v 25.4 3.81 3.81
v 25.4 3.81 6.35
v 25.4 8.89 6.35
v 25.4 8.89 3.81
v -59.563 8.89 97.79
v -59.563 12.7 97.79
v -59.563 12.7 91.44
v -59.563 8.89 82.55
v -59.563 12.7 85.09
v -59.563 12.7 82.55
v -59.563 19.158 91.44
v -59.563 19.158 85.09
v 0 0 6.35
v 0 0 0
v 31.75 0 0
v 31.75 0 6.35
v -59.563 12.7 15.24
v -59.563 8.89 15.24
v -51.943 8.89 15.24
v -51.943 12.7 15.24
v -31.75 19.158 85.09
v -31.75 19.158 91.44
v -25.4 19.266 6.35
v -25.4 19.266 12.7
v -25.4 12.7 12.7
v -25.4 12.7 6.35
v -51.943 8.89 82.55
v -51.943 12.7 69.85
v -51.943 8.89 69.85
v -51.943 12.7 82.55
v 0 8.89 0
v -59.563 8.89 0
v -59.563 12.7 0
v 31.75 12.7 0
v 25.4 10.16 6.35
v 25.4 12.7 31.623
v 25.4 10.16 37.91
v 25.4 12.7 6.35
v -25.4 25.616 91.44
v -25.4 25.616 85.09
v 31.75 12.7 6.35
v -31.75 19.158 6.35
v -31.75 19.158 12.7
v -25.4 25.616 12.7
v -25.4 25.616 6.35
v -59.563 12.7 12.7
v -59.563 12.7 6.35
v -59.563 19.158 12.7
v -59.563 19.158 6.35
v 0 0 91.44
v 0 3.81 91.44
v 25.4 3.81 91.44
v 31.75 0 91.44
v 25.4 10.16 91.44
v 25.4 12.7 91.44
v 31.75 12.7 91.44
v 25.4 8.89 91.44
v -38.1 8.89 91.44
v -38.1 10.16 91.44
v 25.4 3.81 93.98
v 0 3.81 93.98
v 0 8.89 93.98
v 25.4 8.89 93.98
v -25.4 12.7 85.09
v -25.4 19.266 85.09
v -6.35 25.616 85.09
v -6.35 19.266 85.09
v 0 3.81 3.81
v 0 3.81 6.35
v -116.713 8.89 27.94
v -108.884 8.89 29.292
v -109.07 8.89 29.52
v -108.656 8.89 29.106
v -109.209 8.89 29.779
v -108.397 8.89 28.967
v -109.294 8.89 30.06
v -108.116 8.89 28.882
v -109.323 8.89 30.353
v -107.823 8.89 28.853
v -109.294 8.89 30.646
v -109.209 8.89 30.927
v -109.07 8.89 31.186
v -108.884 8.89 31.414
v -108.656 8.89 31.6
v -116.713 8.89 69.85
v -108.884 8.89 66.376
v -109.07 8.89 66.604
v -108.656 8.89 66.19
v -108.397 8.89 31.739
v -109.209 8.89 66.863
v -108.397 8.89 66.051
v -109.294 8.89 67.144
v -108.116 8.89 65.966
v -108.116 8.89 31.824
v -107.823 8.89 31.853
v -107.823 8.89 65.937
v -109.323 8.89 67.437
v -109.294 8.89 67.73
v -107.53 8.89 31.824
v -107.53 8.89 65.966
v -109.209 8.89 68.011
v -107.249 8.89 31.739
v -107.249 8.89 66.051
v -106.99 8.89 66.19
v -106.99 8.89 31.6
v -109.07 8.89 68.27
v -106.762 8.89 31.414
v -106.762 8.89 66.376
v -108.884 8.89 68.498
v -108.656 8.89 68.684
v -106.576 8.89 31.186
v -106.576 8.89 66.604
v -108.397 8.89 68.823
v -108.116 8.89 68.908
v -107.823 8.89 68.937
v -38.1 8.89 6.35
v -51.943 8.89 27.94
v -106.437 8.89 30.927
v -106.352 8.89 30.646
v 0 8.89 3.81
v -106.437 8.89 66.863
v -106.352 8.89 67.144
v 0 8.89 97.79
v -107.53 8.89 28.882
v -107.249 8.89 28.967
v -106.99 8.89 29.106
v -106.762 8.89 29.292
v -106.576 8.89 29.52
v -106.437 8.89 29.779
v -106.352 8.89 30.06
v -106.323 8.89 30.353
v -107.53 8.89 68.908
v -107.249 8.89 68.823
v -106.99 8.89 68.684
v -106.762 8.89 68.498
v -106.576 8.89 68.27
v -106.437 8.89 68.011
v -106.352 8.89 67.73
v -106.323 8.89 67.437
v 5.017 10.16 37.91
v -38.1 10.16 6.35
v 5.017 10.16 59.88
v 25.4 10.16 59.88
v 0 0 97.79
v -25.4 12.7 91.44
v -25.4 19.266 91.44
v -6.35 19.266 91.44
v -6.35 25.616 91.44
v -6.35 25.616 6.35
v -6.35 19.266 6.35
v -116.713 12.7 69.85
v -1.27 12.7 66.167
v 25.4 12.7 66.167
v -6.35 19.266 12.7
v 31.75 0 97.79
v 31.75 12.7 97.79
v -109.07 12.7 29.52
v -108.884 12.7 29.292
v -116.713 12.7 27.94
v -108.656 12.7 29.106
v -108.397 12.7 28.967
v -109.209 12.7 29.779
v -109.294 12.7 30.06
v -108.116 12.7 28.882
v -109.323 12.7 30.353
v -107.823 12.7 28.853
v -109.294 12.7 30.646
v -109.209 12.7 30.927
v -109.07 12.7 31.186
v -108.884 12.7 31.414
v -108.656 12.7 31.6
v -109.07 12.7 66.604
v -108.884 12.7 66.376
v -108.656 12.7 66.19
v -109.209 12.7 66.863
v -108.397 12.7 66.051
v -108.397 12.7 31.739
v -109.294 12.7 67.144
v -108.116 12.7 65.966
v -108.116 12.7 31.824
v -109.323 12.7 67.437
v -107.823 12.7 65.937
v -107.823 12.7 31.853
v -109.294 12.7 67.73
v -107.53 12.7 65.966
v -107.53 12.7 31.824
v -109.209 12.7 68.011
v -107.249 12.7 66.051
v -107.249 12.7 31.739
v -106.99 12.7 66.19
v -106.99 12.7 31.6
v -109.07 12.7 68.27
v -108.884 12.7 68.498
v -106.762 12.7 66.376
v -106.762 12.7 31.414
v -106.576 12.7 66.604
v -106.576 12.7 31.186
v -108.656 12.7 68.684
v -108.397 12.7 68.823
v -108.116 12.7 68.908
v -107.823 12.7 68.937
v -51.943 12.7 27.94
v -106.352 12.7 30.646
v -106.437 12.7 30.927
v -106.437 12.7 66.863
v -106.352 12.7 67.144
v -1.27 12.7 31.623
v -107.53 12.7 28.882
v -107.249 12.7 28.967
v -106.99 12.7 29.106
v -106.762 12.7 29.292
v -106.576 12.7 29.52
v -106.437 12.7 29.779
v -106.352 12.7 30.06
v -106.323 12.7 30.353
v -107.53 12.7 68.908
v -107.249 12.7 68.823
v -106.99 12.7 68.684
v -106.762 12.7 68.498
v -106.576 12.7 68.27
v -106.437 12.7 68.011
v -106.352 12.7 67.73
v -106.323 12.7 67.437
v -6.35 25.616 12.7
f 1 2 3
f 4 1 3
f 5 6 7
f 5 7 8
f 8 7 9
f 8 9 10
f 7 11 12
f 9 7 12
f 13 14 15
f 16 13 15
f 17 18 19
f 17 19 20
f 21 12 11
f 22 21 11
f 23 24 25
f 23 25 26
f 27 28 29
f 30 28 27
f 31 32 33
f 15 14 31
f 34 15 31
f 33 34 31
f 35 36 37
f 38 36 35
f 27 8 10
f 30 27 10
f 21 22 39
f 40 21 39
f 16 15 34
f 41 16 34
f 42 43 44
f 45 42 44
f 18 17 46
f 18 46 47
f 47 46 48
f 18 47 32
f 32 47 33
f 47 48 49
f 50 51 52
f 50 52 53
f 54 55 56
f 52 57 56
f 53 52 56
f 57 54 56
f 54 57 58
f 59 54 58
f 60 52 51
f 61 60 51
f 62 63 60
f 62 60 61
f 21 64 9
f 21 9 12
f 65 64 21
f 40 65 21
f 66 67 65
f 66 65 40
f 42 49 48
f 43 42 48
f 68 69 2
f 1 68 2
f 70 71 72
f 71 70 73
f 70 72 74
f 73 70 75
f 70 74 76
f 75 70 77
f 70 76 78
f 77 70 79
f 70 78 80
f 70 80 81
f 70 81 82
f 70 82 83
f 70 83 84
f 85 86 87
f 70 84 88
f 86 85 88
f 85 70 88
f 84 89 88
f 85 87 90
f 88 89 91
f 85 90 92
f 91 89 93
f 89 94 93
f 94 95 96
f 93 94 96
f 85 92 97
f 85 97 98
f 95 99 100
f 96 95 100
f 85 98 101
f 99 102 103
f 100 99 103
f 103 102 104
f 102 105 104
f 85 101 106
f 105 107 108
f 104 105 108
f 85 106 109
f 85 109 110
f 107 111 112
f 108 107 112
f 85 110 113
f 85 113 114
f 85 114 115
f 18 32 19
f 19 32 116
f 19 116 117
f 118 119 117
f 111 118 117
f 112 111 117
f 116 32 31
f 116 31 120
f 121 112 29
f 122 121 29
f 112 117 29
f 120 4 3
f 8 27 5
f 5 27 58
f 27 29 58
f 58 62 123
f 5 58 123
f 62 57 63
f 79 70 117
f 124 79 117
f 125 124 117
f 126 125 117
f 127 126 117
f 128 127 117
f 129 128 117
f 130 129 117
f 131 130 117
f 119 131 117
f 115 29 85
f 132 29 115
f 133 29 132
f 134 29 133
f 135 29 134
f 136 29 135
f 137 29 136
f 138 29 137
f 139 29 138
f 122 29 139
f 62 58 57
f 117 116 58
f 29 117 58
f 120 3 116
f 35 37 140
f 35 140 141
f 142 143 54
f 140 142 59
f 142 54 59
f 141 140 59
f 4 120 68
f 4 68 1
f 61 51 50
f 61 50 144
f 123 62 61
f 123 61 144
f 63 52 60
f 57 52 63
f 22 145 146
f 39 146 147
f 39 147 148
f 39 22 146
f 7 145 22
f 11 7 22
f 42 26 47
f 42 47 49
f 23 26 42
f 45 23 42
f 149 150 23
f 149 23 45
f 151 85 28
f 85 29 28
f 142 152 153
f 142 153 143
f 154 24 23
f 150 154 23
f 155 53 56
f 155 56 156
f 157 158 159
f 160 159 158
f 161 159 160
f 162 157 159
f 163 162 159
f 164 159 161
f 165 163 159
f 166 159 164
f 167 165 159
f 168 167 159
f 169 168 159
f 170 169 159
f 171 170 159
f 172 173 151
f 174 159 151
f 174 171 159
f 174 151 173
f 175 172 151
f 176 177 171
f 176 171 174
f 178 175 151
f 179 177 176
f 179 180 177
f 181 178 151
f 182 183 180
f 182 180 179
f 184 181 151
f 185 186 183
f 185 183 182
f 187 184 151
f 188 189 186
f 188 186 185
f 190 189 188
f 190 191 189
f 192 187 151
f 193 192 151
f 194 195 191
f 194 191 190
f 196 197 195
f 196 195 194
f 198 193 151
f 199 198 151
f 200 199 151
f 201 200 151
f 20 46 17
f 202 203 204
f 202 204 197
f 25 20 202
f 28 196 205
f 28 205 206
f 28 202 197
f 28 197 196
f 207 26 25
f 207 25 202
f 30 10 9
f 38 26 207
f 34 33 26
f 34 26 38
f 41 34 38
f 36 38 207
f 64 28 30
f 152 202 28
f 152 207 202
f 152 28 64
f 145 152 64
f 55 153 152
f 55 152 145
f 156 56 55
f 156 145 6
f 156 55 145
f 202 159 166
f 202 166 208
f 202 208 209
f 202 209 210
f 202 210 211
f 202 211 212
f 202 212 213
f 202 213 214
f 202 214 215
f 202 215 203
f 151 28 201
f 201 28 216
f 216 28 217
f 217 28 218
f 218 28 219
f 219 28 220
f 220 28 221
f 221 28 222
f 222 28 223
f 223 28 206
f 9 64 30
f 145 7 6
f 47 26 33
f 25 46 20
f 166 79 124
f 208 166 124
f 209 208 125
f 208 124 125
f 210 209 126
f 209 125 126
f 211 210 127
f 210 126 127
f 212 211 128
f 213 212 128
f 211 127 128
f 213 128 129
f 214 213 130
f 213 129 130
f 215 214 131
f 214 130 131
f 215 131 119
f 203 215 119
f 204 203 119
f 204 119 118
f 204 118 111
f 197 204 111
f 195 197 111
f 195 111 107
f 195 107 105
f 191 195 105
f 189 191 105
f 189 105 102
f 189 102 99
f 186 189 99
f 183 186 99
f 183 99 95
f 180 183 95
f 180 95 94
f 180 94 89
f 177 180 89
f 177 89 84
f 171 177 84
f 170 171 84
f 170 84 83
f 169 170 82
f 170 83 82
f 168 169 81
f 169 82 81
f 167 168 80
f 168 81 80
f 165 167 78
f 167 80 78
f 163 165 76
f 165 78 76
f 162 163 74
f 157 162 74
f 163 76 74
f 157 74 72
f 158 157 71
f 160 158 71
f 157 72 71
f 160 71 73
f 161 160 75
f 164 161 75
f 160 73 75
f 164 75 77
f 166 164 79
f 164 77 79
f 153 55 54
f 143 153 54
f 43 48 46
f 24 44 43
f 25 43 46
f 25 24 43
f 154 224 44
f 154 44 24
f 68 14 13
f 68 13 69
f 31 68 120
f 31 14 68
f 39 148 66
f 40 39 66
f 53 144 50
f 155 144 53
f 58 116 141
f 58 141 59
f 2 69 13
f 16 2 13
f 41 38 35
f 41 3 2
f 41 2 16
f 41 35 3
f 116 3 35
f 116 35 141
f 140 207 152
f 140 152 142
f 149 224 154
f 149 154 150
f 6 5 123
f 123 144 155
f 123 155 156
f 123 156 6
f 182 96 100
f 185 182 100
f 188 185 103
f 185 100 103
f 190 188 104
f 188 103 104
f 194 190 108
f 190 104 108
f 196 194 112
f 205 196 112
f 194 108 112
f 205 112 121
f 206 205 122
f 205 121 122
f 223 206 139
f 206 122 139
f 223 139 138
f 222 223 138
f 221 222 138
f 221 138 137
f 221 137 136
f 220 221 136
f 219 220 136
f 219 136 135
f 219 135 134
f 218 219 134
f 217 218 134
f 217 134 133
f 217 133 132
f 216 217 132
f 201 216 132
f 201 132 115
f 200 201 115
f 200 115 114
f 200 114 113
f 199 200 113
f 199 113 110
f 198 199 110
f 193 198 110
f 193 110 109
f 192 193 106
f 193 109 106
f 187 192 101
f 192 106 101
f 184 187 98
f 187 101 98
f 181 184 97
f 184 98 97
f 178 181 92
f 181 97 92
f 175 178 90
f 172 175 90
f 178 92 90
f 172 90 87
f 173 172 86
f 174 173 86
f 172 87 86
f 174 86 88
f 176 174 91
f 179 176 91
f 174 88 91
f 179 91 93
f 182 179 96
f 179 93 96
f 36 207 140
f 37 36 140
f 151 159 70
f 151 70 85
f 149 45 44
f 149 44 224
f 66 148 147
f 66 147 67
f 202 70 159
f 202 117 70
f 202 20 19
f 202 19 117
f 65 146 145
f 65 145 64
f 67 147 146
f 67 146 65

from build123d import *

# Parameters (mm, degrees)
SKETCH1_W                = 31.75
SKETCH1_H                = 12.7
BOSS_EXTRUDE1_DEPTH      = 6.35
SKETCH3_W                = 25.4
SKETCH3_H                = 5.08
CUT_EXTRUDE1_DEPTH       = 2.54
BOSS_EXTRUDE2_DEPTH      = 3.81
SKETCH5_W                = 31.75
SKETCH5_H                = 6.35
BOSS_EXTRUDE3_DEPTH      = 8.89
SKETCH6_W                = 25.4
SKETCH6_H                = 5.08
CUT_EXTRUDE2_DEPTH       = 2.54
SKETCH9_W                = 6.35
SKETCH9_H                = 3.81
BOSS_EXTRUDE5_DEPTH      = 6.35
SKETCH10_W               = 6.35
SKETCH10_H               = 6.35
BOSS_EXTRUDE6_DEPTH      = 12.9159
SKETCH12_W               = 6.35
SKETCH12_H               = 3.81
BOSS_EXTRUDE8_DEPTH      = 6.35
SKETCH14_W               = 6.35
SKETCH14_H               = 6.35
BOSS_EXTRUDE11_DEPTH     = 19.05
CUT_EXTRUDE9_DEPTH       = 101.12747092
SKETCH19_W               = 72.39
SKETCH19_H               = 3.81
BOSS_EXTRUDE12_DEPTH     = 34.163
BOSS_EXTRUDE13_DEPTH     = 27.813
SKETCH21_W               = 12.7
SKETCH21_H               = 3.81
CUT_EXTRUDE10_DEPTH      = 7.62
SKETCH22_W               = 41.91
SKETCH22_H               = 3.81
BOSS_EXTRUDE14_DEPTH     = 50.8
SKETCH23_W               = 85.09
SKETCH23_H               = 3.81
BOSS_EXTRUDE15_DEPTH     = 44.45
SKETCH24_R               = 1.5
CUT_EXTRUDE11_DEPTH      = 149.400241239
SKETCH25_W               = 41.91
SKETCH25_H               = 3.81
BOSS_EXTRUDE16_DEPTH     = 6.35
CUT_EXTRUDE12_DEPTH      = 154.181474728
CUT_EXTRUDE12_DEPTH_BACK = 154.181474728
CUT_EXTRUDE13_DEPTH      = 1.27
CHAMFER1_SIZE            = 6.35
CHAMFER1_SIZE_2          = 2.565566534


with BuildPart() as part:
    # Sketch1 → Boss-Extrude1 (new body)
    with BuildSketch(Plane.XY):
        with Locations((15.875, 6.35)):
            Rectangle(SKETCH1_W, SKETCH1_H)
    extrude(amount=BOSS_EXTRUDE1_DEPTH)

    # Sketch3 → Cut-Extrude1 (cut)
    with BuildSketch(Plane.XY.offset(6.35)):
        with Locations((12.7, 6.35)):
            Rectangle(SKETCH3_W, SKETCH3_H)
    extrude(amount=-CUT_EXTRUDE1_DEPTH, mode=Mode.SUBTRACT)

    # Sketch4 → Boss-Extrude2 (add)
    with BuildSketch(Plane(origin=(0, 12.7, 0), x_dir=(1, 0, 0), z_dir=(0, 1, 0))):
        Polygon((0, 0), (-25.4, 0), (-25.4, -97.79), (31.75, -97.79), (31.75, -91.44), (-19.05, -91.44), (-19.05, -6.35), (0, -6.35), align=None)
    extrude(amount=-BOSS_EXTRUDE2_DEPTH)

    # Sketch5 → Boss-Extrude3 (add)
    with BuildSketch(Plane.XZ.offset(-8.89)):
        with Locations((15.875, 94.615)):
            Rectangle(SKETCH5_W, SKETCH5_H)
    extrude(amount=BOSS_EXTRUDE3_DEPTH)

    # Sketch6 → Cut-Extrude2 (cut)
    with BuildSketch(Plane(origin=(0, 0, 91.44), x_dir=(-1, 0, 0), z_dir=(0, 0, -1))):
        with Locations((-12.7, 6.35)):
            Rectangle(SKETCH6_W, SKETCH6_H)
    extrude(amount=-CUT_EXTRUDE2_DEPTH, mode=Mode.SUBTRACT)

    # Sketch9 → Boss-Extrude5 (add)
    with BuildSketch(Plane.ZY.offset(25.4)):
        with Locations((88.265, 10.795)):
            Rectangle(SKETCH9_W, SKETCH9_H)
        with Locations((9.525, 10.795)):
            Rectangle(SKETCH9_W, SKETCH9_H)
    extrude(amount=BOSS_EXTRUDE5_DEPTH)

    # Sketch10 → Boss-Extrude6 (add)
    with BuildSketch(Plane(origin=(0, 12.7, 0), x_dir=(1, 0, 0), z_dir=(0, 1, 0))):
        with Locations((-28.575, -88.265)):
            Rectangle(SKETCH10_W, SKETCH10_H)
        with Locations((-28.575, -9.525)):
            Rectangle(SKETCH10_W, SKETCH10_H)
    extrude(amount=BOSS_EXTRUDE6_DEPTH)

    # Sketch12 → Boss-Extrude8 (add)
    with BuildSketch(Plane.ZY.offset(25.4)):
        with Locations((94.615, 10.795)):
            Rectangle(SKETCH12_W, SKETCH12_H)
        with Locations((3.175, 10.795)):
            Rectangle(SKETCH12_W, SKETCH12_H)
    extrude(amount=BOSS_EXTRUDE8_DEPTH)

    # Sketch14 → Boss-Extrude11 (add)
    with BuildSketch(Plane(origin=(-25.4, 0, 0), x_dir=(0, 0, -1), z_dir=(1, 0, 0))):
        with Locations((-88.265, 22.4409)):
            Rectangle(SKETCH14_W, SKETCH14_H)
        with Locations((-9.525, 22.4409)):
            Rectangle(SKETCH14_W, SKETCH14_H)
    extrude(amount=BOSS_EXTRUDE11_DEPTH)

    # Sketch18 → Cut-Extrude9 (cut, through all)
    with BuildSketch(Plane.XY.offset(91.44)):
        Polygon((-31.75, 19.15795), (-25.4, 25.6159), (-31.75, 25.6159), align=None)
    extrude(amount=-CUT_EXTRUDE9_DEPTH, mode=Mode.SUBTRACT)

    # Sketch19 → Boss-Extrude12 (add)
    with BuildSketch(Plane.ZY.offset(25.4)):
        with Locations((48.895, 10.795)):
            Rectangle(SKETCH19_W, SKETCH19_H)
    extrude(amount=BOSS_EXTRUDE12_DEPTH)

    # Sketch20 → Boss-Extrude13 (add)
    with BuildSketch(Plane.ZY.offset(31.75)):
        Polygon((0, 8.89), (0, 12.7), (6.35, 12.7), (6.35, 19.15795), (12.7, 19.15795), (12.7, 8.89), align=None)
        Polygon((85.09, 19.15795), (91.44, 19.15795), (91.44, 12.7), (97.79, 12.7), (97.79, 8.89), (85.09, 8.89), align=None)
    extrude(amount=BOSS_EXTRUDE13_DEPTH)

    # Sketch21 → Cut-Extrude10 (cut)
    with BuildSketch(Plane.ZY.offset(59.563)):
        with Locations((21.59, 10.795)):
            Rectangle(SKETCH21_W, SKETCH21_H)
        with Locations((76.2, 10.795)):
            Rectangle(SKETCH21_W, SKETCH21_H)
    extrude(amount=-CUT_EXTRUDE10_DEPTH, mode=Mode.SUBTRACT)

    # Sketch22 → Boss-Extrude14 (add)
    with BuildSketch(Plane.ZY.offset(59.563)):
        with Locations((48.895, 10.795)):
            Rectangle(SKETCH22_W, SKETCH22_H)
    extrude(amount=BOSS_EXTRUDE14_DEPTH)

    # Sketch23 → Boss-Extrude15 (add)
    with BuildSketch(Plane(origin=(-19.05, 0, 0), x_dir=(0, 0, -1), z_dir=(1, 0, 0))):
        with Locations((-48.895, 10.795)):
            Rectangle(SKETCH23_W, SKETCH23_H)
    extrude(amount=BOSS_EXTRUDE15_DEPTH)

    # Sketch24 → Cut-Extrude11 (cut, through all)
    with BuildSketch(Plane.XZ.offset(-8.89)):
        with Locations(Location((-107.823, 30.353, 0), (0, 0, 270))):
            Circle(SKETCH24_R)
        with Locations(Location((-107.823, 67.437, 0), (0, 0, 270))):
            Circle(SKETCH24_R)
    extrude(amount=-CUT_EXTRUDE11_DEPTH, mode=Mode.SUBTRACT)

    # Sketch25 → Boss-Extrude16 (add)
    with BuildSketch(Plane.ZY.offset(110.363)):
        with Locations((48.895, 10.795)):
            Rectangle(SKETCH25_W, SKETCH25_H)
    extrude(amount=BOSS_EXTRUDE16_DEPTH)

    # Sketch26 → Cut-Extrude12 (cut, two sides: drawn at the far end of the back side and taken through both)
    with BuildSketch(Plane.XZ.offset(-8.89).offset(-CUT_EXTRUDE12_DEPTH_BACK)):
        Polygon((25.4, 37.973), (25.4, 48.895), (25.4, 59.817), (5.08, 59.817), (5.08, 37.973), align=None)
    extrude(amount=CUT_EXTRUDE12_DEPTH + CUT_EXTRUDE12_DEPTH_BACK, mode=Mode.SUBTRACT)

    # Sketch27 → Cut-Extrude13 (cut)
    with BuildSketch(Plane.XZ.offset(-8.89)):
        Polygon((25.4, 37.973), (25.4, 6.35), (-38.1, 6.35), (-38.1, 91.44), (25.4, 91.44), (25.4, 59.817), (5.08, 59.817), (5.08, 37.973), align=None)
    extrude(amount=-CUT_EXTRUDE13_DEPTH, mode=Mode.SUBTRACT)

    # Chamfer1
    # the kernel refuses this chamfer: 6.35, 2.565566534 mm, written as the material it takes off along each edge
    with BuildSketch(Plane(origin=(5.08, 12.7, 59.817), x_dir=(0, 0.014446902557764131, 0.9998956380575357), z_dir=(1, 0, 0)), Plane(origin=(41.865480117, 12.7, 37.973), x_dir=(0, 0.014446902557764124, -0.9998956380575357), z_dir=(-1, 0, 0))) as chamfer1_piece_1:
        Polygon((CHAMFER1_SIZE * 0.999895638058, CHAMFER1_SIZE * 0.0144469025578), (-CHAMFER1_SIZE_2 * 0.0144469025581, CHAMFER1_SIZE_2 * 0.999895638078), (0, 0), align=None)
    extrude(amount=36.785480117, mode=Mode.SUBTRACT)
    with BuildSketch(Plane(origin=(5.08, 12.7, 37.973), x_dir=(-0.9998956380575357, 0.01444690255776412, 0), z_dir=(0, 0, 1))) as chamfer1_piece_2:
        Polygon((CHAMFER1_SIZE * 0.999895638058, CHAMFER1_SIZE * 0.0144469025578), (-CHAMFER1_SIZE_2 * 0.0144469025581, CHAMFER1_SIZE_2 * 0.999895638078), (0, 0), align=None)
    extrude(amount=21.844, mode=Mode.SUBTRACT)
    with BuildSketch(Plane(origin=(-11.385480117, 12.7, 59.817), x_dir=(0, 0.014446902557764131, 0.9998956380575357), z_dir=(1, 0, 0))) as chamfer1_piece_3a_section:
        Polygon((CHAMFER1_SIZE * 0.999895638058, CHAMFER1_SIZE * 0.0144469025578), (-CHAMFER1_SIZE_2 * 0.0144469025581, CHAMFER1_SIZE_2 * 0.999895638078), (0, 0), align=None)
    chamfer1_piece_3a = extrude(amount=53.250960234, mode=Mode.PRIVATE)
    chamfer1_piece_3a = split(chamfer1_piece_3a, bisect_by=Plane(origin=(5.08, 11.901985968, 61.978678206), z_dir=(-1, 0, 0)), keep=Keep.TOP, mode=Mode.PRIVATE)
    with BuildSketch(Plane(origin=(5.08, 12.7, 37.973), x_dir=(-0.9998956380575357, 0.01444690255776412, 0), z_dir=(0, 0, 1))) as chamfer1_piece_3b_section:
        Polygon((CHAMFER1_SIZE * 0.999895638058, CHAMFER1_SIZE * 0.0144469025578), (-CHAMFER1_SIZE_2 * 0.0144469025581, CHAMFER1_SIZE_2 * 0.999895638078), (0, 0), align=None)
    chamfer1_piece_3b = extrude(amount=38.309480117, mode=Mode.PRIVATE)
    chamfer1_piece_3b = split(chamfer1_piece_3b, bisect_by=Plane(origin=(2.918321794, 11.901985968, 59.817), z_dir=(0, 0, 1)), keep=Keep.TOP, mode=Mode.PRIVATE)
    chamfer1_piece_3 = chamfer1_piece_3a & chamfer1_piece_3b
    add(chamfer1_piece_3, mode=Mode.SUBTRACT)
    with BuildSketch(Plane(origin=(5.08, 12.7, 21.507519883), x_dir=(-0.9998956380575357, 0.01444690255776412, 0), z_dir=(0, 0, 1))) as chamfer1_piece_4a_section:
        Polygon((CHAMFER1_SIZE * 0.999895638058, CHAMFER1_SIZE * 0.0144469025578), (-CHAMFER1_SIZE_2 * 0.0144469025581, CHAMFER1_SIZE_2 * 0.999895638078), (0, 0), align=None)
    chamfer1_piece_4a = extrude(amount=38.309480117, mode=Mode.PRIVATE)
    chamfer1_piece_4a = split(chamfer1_piece_4a, bisect_by=Plane(origin=(2.918321794, 11.901985968, 37.973), z_dir=(0, 0, -1)), keep=Keep.TOP, mode=Mode.PRIVATE)
    with BuildSketch(Plane(origin=(41.865480117, 12.7, 37.973), x_dir=(0, 0.014446902557764124, -0.9998956380575357), z_dir=(-1, 0, 0))) as chamfer1_piece_4b_section:
        Polygon((CHAMFER1_SIZE * 0.999895638058, CHAMFER1_SIZE * 0.0144469025578), (-CHAMFER1_SIZE_2 * 0.0144469025581, CHAMFER1_SIZE_2 * 0.999895638078), (0, 0), align=None)
    chamfer1_piece_4b = extrude(amount=53.250960234, mode=Mode.PRIVATE)
    chamfer1_piece_4b = split(chamfer1_piece_4b, bisect_by=Plane(origin=(5.08, 11.901985968, 35.811321794), z_dir=(-1, 0, 0)), keep=Keep.TOP, mode=Mode.PRIVATE)
    chamfer1_piece_4 = chamfer1_piece_4a & chamfer1_piece_4b
    add(chamfer1_piece_4, mode=Mode.SUBTRACT)


solid = part.part
